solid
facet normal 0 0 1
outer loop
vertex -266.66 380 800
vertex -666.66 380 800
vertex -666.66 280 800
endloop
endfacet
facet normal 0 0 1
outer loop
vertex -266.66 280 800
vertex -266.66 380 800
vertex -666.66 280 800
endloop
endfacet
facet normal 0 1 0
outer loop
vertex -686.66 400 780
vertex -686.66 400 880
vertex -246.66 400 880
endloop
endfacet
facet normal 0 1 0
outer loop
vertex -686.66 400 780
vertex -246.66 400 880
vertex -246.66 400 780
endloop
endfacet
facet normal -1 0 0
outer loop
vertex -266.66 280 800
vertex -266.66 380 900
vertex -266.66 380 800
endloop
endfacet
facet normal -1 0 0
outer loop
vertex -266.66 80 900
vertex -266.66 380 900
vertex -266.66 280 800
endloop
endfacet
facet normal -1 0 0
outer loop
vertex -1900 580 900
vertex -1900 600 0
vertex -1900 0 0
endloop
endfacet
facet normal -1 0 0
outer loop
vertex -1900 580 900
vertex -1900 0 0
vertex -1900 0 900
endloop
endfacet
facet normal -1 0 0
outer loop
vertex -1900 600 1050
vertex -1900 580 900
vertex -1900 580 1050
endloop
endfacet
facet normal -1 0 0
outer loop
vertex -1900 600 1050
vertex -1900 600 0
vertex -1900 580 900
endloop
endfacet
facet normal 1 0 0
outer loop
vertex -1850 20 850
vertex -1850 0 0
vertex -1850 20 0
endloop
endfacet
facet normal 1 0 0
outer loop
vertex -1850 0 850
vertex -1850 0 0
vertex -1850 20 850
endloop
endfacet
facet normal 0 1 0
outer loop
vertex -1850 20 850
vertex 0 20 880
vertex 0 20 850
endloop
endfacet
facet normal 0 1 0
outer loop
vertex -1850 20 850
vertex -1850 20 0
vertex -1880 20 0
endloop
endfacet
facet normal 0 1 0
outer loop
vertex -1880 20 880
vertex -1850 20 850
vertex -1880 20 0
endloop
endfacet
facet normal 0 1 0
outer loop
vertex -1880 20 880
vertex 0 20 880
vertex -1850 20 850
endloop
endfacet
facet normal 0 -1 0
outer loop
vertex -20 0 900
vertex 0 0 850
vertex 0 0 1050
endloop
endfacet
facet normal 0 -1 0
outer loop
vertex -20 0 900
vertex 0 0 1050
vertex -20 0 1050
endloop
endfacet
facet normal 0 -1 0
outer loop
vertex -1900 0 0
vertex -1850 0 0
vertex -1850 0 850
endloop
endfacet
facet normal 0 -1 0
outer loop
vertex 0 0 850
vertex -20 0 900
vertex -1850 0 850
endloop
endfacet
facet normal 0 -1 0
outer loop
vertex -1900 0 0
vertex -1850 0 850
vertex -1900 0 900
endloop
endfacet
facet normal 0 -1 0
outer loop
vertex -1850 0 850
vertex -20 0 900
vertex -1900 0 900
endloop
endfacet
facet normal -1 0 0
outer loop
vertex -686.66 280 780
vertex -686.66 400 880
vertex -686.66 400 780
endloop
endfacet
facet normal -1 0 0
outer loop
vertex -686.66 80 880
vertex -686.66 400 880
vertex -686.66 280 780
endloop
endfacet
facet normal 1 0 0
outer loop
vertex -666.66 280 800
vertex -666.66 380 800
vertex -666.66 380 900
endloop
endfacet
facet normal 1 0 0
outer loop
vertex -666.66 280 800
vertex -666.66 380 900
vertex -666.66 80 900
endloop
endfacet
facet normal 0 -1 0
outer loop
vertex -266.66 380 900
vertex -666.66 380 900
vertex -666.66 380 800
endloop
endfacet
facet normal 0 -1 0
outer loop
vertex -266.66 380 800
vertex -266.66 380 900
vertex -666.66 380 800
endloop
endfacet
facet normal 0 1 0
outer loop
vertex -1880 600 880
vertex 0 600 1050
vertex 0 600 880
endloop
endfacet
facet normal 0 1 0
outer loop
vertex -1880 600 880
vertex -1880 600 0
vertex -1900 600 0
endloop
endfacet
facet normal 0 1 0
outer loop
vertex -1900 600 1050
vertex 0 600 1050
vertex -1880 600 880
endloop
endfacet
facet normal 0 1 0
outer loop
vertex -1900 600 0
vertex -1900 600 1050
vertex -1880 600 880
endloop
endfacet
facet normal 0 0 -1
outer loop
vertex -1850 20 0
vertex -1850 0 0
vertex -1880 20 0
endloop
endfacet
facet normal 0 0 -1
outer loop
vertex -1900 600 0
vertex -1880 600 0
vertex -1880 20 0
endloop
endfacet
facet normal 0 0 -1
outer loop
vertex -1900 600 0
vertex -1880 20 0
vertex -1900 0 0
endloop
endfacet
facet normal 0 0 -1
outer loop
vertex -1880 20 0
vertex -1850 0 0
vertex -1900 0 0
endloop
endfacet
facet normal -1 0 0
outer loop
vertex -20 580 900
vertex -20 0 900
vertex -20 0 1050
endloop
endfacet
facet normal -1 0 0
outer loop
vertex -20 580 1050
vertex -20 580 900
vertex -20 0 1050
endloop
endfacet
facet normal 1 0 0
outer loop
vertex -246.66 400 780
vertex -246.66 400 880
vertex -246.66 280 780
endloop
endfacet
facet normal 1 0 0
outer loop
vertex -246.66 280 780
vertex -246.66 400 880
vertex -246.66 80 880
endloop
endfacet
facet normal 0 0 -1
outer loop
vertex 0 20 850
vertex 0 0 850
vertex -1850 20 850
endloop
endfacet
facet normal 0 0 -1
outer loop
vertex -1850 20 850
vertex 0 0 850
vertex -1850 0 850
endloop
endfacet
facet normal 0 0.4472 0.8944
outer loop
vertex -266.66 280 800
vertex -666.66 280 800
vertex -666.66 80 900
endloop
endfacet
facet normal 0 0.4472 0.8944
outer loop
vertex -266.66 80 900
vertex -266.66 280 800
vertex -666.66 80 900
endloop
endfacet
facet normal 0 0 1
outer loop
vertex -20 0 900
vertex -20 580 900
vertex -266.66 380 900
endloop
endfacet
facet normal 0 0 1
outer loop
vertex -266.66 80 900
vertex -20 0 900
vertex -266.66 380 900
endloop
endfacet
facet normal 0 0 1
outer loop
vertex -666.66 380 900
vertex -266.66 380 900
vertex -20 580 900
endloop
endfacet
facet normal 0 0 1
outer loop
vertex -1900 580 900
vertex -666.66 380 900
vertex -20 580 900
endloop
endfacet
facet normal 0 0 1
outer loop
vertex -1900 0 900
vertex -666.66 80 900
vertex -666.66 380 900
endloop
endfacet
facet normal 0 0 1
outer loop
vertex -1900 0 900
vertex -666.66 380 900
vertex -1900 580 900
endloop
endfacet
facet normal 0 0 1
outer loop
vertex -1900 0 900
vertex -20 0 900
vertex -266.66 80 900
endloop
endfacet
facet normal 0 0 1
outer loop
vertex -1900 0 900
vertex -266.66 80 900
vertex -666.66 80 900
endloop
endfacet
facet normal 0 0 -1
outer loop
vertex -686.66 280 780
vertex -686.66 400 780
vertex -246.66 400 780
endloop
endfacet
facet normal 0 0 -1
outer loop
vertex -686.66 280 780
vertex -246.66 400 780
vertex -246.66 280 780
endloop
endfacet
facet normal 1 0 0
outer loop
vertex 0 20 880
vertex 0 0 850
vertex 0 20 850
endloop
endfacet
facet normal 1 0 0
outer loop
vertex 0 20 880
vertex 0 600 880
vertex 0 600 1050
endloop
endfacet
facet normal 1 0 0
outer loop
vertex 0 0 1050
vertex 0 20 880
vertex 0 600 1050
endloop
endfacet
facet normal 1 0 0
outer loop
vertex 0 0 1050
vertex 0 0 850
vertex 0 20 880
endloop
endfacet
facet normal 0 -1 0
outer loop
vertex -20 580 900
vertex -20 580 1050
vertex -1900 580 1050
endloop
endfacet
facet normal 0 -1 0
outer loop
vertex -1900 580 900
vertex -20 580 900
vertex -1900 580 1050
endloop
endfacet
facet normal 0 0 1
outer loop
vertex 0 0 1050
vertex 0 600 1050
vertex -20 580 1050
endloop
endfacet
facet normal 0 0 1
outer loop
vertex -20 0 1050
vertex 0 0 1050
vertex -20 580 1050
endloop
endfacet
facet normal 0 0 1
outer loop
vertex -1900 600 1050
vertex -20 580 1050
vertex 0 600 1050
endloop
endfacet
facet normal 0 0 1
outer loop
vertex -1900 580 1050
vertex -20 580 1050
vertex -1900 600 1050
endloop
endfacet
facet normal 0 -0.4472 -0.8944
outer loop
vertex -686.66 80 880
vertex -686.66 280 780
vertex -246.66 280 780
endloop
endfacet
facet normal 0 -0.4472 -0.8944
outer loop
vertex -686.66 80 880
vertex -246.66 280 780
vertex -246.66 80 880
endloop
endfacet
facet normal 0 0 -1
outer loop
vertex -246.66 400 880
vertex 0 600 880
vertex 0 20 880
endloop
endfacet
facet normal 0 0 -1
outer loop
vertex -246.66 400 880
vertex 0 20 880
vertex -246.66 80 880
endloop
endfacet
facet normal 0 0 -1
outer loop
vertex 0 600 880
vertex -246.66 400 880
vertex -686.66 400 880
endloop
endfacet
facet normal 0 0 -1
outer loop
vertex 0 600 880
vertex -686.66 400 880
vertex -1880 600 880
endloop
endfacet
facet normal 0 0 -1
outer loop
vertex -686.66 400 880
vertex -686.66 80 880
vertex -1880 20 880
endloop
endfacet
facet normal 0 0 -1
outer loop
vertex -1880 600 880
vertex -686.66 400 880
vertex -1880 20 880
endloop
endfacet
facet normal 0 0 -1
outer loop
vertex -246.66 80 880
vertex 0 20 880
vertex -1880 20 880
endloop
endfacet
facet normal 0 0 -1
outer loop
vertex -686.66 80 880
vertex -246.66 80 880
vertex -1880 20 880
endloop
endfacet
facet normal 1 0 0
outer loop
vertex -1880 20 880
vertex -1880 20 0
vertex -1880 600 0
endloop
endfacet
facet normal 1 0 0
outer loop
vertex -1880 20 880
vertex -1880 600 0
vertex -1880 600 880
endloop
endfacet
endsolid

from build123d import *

# Parameters (mm, degrees)
SKETCH002_W      = 1880
SKETCH002_H      = 880
EXTRUDE002_DEPTH = 580
SKETCH001_W      = 1850
SKETCH001_H      = 850
EXTRUDE001_DEPTH = 20
SKETCH003_W      = 400
SKETCH003_H      = 300
EXTRUDE003_DEPTH = 20
SKETCH004_W      = 1900
SKETCH004_H      = 150
EXTRUDE004_DEPTH = 20
SKETCH005_W      = 20
SKETCH005_H      = 150
EXTRUDE005_DEPTH = 600
SKETCH_W         = 1900
SKETCH_H         = 900
EXTRUDE_DEPTH    = 600
EXTRUDE006_DEPTH = 400
EXTRUDE007_DEPTH = 440


with BuildPart() as base:
    # Sketch002 → Extrude002 (new body)
    with BuildSketch(Plane.XZ):
        with Locations((940, 440)):
            Rectangle(SKETCH002_W, SKETCH002_H)
    extrude(amount=-EXTRUDE002_DEPTH)


with BuildPart() as base_1:
    # Extrude002 placement: moved
    add(base.part.moved(Location((0, 20, 0))))


with BuildPart() as saia:
    # Sketch001 → Extrude001 (new body)
    with BuildSketch(Plane.XZ):
        with Locations((925, 425)):
            Rectangle(SKETCH001_W, SKETCH001_H)
    extrude(amount=-EXTRUDE001_DEPTH)


with BuildPart() as cortes:
    # Sketch003 → Extrude003 (new body)
    with BuildSketch(Plane.XY):
        with Locations((200, 150)):
            Rectangle(SKETCH003_W, SKETCH003_H)
    extrude(amount=EXTRUDE003_DEPTH)


with BuildPart() as cortes_1:
    # Extrude003 placement: moved
    add(cortes.part.moved(Location((266.66, 80, 880))))

    # Fusion: union Base , Saia
    add(base_1.part)
    add(saia.part)


with BuildPart() as roda_m_o:
    # Sketch004 → Extrude004 (new body)
    with BuildSketch(Plane.XZ):
        with Locations((950, 75)):
            Rectangle(SKETCH004_W, SKETCH004_H)
    extrude(amount=EXTRUDE004_DEPTH)


with BuildPart() as roda_m_o_1:
    # Extrude004 placement: moved
    add(roda_m_o.part.moved(Location((0, 600, 900))))


with BuildPart() as extrude005:
    # Sketch005 → Extrude005 (new body)
    with BuildSketch(Plane.XZ):
        with Locations((10, 75)):
            Rectangle(SKETCH005_W, SKETCH005_H)
    extrude(amount=-EXTRUDE005_DEPTH)


with BuildPart() as extrude005_1:
    # Extrude005 placement: moved
    add(extrude005.part.moved(Location((0, 0, 900))))


with BuildPart() as cut:
    # Sketch → Extrude (new body)
    with BuildSketch(Plane.XZ):
        with Locations((950, 450)):
            Rectangle(SKETCH_W, SKETCH_H)
    extrude(amount=-EXTRUDE_DEPTH)

    # Fusion001: union Roda mão , Extrude005
    add(roda_m_o_1.part)
    add(extrude005_1.part)

    # Cut: cut Cortes
    add(cortes_1.part, mode=Mode.SUBTRACT)


with BuildPart() as extrude006:
    # Sketch006 → Extrude006 (new body)
    with BuildSketch(Plane.YZ):
        Polygon((0, 0), (300, 0), (300, -100), (200, -100), align=None)
    extrude(amount=EXTRUDE006_DEPTH)


with BuildPart() as lavat_rio_cuba_esculpida_1_p_fechado001:
    # Sketch007 → Extrude007 (new body)
    with BuildSketch(Plane.YZ):
        Polygon((-40, 0), (320, 0), (320, -120), (200, -120), align=None)
    extrude(amount=EXTRUDE007_DEPTH)


with BuildPart() as lavat_rio_cuba_esculpida_1_p_fechado001_1:
    # Extrude007 placement: moved
    add(lavat_rio_cuba_esculpida_1_p_fechado001.part.moved(Location((-20, 0, 0))))

    # Cut001: cut Extrude006
    add(extrude006.part, mode=Mode.SUBTRACT)


with BuildPart() as lavat_rio_cuba_esculpida_1_p_fechado001_2:
    # Cut001 placement: moved
    add(lavat_rio_cuba_esculpida_1_p_fechado001_1.part.moved(Location((266.66, 80, 900))))

    # Fusion015: union Cut
    add(cut.part)


with BuildPart() as mirror:
    # Mirror: instance of lavatório cuba esculpida 1 pé fechado001
    add(lavat_rio_cuba_esculpida_1_p_fechado001_2.part.mirror(Plane(origin=(0, 0, 0), x_dir=(0, -1, 0), z_dir=(1, 0, 0))))


solid = mirror.part
